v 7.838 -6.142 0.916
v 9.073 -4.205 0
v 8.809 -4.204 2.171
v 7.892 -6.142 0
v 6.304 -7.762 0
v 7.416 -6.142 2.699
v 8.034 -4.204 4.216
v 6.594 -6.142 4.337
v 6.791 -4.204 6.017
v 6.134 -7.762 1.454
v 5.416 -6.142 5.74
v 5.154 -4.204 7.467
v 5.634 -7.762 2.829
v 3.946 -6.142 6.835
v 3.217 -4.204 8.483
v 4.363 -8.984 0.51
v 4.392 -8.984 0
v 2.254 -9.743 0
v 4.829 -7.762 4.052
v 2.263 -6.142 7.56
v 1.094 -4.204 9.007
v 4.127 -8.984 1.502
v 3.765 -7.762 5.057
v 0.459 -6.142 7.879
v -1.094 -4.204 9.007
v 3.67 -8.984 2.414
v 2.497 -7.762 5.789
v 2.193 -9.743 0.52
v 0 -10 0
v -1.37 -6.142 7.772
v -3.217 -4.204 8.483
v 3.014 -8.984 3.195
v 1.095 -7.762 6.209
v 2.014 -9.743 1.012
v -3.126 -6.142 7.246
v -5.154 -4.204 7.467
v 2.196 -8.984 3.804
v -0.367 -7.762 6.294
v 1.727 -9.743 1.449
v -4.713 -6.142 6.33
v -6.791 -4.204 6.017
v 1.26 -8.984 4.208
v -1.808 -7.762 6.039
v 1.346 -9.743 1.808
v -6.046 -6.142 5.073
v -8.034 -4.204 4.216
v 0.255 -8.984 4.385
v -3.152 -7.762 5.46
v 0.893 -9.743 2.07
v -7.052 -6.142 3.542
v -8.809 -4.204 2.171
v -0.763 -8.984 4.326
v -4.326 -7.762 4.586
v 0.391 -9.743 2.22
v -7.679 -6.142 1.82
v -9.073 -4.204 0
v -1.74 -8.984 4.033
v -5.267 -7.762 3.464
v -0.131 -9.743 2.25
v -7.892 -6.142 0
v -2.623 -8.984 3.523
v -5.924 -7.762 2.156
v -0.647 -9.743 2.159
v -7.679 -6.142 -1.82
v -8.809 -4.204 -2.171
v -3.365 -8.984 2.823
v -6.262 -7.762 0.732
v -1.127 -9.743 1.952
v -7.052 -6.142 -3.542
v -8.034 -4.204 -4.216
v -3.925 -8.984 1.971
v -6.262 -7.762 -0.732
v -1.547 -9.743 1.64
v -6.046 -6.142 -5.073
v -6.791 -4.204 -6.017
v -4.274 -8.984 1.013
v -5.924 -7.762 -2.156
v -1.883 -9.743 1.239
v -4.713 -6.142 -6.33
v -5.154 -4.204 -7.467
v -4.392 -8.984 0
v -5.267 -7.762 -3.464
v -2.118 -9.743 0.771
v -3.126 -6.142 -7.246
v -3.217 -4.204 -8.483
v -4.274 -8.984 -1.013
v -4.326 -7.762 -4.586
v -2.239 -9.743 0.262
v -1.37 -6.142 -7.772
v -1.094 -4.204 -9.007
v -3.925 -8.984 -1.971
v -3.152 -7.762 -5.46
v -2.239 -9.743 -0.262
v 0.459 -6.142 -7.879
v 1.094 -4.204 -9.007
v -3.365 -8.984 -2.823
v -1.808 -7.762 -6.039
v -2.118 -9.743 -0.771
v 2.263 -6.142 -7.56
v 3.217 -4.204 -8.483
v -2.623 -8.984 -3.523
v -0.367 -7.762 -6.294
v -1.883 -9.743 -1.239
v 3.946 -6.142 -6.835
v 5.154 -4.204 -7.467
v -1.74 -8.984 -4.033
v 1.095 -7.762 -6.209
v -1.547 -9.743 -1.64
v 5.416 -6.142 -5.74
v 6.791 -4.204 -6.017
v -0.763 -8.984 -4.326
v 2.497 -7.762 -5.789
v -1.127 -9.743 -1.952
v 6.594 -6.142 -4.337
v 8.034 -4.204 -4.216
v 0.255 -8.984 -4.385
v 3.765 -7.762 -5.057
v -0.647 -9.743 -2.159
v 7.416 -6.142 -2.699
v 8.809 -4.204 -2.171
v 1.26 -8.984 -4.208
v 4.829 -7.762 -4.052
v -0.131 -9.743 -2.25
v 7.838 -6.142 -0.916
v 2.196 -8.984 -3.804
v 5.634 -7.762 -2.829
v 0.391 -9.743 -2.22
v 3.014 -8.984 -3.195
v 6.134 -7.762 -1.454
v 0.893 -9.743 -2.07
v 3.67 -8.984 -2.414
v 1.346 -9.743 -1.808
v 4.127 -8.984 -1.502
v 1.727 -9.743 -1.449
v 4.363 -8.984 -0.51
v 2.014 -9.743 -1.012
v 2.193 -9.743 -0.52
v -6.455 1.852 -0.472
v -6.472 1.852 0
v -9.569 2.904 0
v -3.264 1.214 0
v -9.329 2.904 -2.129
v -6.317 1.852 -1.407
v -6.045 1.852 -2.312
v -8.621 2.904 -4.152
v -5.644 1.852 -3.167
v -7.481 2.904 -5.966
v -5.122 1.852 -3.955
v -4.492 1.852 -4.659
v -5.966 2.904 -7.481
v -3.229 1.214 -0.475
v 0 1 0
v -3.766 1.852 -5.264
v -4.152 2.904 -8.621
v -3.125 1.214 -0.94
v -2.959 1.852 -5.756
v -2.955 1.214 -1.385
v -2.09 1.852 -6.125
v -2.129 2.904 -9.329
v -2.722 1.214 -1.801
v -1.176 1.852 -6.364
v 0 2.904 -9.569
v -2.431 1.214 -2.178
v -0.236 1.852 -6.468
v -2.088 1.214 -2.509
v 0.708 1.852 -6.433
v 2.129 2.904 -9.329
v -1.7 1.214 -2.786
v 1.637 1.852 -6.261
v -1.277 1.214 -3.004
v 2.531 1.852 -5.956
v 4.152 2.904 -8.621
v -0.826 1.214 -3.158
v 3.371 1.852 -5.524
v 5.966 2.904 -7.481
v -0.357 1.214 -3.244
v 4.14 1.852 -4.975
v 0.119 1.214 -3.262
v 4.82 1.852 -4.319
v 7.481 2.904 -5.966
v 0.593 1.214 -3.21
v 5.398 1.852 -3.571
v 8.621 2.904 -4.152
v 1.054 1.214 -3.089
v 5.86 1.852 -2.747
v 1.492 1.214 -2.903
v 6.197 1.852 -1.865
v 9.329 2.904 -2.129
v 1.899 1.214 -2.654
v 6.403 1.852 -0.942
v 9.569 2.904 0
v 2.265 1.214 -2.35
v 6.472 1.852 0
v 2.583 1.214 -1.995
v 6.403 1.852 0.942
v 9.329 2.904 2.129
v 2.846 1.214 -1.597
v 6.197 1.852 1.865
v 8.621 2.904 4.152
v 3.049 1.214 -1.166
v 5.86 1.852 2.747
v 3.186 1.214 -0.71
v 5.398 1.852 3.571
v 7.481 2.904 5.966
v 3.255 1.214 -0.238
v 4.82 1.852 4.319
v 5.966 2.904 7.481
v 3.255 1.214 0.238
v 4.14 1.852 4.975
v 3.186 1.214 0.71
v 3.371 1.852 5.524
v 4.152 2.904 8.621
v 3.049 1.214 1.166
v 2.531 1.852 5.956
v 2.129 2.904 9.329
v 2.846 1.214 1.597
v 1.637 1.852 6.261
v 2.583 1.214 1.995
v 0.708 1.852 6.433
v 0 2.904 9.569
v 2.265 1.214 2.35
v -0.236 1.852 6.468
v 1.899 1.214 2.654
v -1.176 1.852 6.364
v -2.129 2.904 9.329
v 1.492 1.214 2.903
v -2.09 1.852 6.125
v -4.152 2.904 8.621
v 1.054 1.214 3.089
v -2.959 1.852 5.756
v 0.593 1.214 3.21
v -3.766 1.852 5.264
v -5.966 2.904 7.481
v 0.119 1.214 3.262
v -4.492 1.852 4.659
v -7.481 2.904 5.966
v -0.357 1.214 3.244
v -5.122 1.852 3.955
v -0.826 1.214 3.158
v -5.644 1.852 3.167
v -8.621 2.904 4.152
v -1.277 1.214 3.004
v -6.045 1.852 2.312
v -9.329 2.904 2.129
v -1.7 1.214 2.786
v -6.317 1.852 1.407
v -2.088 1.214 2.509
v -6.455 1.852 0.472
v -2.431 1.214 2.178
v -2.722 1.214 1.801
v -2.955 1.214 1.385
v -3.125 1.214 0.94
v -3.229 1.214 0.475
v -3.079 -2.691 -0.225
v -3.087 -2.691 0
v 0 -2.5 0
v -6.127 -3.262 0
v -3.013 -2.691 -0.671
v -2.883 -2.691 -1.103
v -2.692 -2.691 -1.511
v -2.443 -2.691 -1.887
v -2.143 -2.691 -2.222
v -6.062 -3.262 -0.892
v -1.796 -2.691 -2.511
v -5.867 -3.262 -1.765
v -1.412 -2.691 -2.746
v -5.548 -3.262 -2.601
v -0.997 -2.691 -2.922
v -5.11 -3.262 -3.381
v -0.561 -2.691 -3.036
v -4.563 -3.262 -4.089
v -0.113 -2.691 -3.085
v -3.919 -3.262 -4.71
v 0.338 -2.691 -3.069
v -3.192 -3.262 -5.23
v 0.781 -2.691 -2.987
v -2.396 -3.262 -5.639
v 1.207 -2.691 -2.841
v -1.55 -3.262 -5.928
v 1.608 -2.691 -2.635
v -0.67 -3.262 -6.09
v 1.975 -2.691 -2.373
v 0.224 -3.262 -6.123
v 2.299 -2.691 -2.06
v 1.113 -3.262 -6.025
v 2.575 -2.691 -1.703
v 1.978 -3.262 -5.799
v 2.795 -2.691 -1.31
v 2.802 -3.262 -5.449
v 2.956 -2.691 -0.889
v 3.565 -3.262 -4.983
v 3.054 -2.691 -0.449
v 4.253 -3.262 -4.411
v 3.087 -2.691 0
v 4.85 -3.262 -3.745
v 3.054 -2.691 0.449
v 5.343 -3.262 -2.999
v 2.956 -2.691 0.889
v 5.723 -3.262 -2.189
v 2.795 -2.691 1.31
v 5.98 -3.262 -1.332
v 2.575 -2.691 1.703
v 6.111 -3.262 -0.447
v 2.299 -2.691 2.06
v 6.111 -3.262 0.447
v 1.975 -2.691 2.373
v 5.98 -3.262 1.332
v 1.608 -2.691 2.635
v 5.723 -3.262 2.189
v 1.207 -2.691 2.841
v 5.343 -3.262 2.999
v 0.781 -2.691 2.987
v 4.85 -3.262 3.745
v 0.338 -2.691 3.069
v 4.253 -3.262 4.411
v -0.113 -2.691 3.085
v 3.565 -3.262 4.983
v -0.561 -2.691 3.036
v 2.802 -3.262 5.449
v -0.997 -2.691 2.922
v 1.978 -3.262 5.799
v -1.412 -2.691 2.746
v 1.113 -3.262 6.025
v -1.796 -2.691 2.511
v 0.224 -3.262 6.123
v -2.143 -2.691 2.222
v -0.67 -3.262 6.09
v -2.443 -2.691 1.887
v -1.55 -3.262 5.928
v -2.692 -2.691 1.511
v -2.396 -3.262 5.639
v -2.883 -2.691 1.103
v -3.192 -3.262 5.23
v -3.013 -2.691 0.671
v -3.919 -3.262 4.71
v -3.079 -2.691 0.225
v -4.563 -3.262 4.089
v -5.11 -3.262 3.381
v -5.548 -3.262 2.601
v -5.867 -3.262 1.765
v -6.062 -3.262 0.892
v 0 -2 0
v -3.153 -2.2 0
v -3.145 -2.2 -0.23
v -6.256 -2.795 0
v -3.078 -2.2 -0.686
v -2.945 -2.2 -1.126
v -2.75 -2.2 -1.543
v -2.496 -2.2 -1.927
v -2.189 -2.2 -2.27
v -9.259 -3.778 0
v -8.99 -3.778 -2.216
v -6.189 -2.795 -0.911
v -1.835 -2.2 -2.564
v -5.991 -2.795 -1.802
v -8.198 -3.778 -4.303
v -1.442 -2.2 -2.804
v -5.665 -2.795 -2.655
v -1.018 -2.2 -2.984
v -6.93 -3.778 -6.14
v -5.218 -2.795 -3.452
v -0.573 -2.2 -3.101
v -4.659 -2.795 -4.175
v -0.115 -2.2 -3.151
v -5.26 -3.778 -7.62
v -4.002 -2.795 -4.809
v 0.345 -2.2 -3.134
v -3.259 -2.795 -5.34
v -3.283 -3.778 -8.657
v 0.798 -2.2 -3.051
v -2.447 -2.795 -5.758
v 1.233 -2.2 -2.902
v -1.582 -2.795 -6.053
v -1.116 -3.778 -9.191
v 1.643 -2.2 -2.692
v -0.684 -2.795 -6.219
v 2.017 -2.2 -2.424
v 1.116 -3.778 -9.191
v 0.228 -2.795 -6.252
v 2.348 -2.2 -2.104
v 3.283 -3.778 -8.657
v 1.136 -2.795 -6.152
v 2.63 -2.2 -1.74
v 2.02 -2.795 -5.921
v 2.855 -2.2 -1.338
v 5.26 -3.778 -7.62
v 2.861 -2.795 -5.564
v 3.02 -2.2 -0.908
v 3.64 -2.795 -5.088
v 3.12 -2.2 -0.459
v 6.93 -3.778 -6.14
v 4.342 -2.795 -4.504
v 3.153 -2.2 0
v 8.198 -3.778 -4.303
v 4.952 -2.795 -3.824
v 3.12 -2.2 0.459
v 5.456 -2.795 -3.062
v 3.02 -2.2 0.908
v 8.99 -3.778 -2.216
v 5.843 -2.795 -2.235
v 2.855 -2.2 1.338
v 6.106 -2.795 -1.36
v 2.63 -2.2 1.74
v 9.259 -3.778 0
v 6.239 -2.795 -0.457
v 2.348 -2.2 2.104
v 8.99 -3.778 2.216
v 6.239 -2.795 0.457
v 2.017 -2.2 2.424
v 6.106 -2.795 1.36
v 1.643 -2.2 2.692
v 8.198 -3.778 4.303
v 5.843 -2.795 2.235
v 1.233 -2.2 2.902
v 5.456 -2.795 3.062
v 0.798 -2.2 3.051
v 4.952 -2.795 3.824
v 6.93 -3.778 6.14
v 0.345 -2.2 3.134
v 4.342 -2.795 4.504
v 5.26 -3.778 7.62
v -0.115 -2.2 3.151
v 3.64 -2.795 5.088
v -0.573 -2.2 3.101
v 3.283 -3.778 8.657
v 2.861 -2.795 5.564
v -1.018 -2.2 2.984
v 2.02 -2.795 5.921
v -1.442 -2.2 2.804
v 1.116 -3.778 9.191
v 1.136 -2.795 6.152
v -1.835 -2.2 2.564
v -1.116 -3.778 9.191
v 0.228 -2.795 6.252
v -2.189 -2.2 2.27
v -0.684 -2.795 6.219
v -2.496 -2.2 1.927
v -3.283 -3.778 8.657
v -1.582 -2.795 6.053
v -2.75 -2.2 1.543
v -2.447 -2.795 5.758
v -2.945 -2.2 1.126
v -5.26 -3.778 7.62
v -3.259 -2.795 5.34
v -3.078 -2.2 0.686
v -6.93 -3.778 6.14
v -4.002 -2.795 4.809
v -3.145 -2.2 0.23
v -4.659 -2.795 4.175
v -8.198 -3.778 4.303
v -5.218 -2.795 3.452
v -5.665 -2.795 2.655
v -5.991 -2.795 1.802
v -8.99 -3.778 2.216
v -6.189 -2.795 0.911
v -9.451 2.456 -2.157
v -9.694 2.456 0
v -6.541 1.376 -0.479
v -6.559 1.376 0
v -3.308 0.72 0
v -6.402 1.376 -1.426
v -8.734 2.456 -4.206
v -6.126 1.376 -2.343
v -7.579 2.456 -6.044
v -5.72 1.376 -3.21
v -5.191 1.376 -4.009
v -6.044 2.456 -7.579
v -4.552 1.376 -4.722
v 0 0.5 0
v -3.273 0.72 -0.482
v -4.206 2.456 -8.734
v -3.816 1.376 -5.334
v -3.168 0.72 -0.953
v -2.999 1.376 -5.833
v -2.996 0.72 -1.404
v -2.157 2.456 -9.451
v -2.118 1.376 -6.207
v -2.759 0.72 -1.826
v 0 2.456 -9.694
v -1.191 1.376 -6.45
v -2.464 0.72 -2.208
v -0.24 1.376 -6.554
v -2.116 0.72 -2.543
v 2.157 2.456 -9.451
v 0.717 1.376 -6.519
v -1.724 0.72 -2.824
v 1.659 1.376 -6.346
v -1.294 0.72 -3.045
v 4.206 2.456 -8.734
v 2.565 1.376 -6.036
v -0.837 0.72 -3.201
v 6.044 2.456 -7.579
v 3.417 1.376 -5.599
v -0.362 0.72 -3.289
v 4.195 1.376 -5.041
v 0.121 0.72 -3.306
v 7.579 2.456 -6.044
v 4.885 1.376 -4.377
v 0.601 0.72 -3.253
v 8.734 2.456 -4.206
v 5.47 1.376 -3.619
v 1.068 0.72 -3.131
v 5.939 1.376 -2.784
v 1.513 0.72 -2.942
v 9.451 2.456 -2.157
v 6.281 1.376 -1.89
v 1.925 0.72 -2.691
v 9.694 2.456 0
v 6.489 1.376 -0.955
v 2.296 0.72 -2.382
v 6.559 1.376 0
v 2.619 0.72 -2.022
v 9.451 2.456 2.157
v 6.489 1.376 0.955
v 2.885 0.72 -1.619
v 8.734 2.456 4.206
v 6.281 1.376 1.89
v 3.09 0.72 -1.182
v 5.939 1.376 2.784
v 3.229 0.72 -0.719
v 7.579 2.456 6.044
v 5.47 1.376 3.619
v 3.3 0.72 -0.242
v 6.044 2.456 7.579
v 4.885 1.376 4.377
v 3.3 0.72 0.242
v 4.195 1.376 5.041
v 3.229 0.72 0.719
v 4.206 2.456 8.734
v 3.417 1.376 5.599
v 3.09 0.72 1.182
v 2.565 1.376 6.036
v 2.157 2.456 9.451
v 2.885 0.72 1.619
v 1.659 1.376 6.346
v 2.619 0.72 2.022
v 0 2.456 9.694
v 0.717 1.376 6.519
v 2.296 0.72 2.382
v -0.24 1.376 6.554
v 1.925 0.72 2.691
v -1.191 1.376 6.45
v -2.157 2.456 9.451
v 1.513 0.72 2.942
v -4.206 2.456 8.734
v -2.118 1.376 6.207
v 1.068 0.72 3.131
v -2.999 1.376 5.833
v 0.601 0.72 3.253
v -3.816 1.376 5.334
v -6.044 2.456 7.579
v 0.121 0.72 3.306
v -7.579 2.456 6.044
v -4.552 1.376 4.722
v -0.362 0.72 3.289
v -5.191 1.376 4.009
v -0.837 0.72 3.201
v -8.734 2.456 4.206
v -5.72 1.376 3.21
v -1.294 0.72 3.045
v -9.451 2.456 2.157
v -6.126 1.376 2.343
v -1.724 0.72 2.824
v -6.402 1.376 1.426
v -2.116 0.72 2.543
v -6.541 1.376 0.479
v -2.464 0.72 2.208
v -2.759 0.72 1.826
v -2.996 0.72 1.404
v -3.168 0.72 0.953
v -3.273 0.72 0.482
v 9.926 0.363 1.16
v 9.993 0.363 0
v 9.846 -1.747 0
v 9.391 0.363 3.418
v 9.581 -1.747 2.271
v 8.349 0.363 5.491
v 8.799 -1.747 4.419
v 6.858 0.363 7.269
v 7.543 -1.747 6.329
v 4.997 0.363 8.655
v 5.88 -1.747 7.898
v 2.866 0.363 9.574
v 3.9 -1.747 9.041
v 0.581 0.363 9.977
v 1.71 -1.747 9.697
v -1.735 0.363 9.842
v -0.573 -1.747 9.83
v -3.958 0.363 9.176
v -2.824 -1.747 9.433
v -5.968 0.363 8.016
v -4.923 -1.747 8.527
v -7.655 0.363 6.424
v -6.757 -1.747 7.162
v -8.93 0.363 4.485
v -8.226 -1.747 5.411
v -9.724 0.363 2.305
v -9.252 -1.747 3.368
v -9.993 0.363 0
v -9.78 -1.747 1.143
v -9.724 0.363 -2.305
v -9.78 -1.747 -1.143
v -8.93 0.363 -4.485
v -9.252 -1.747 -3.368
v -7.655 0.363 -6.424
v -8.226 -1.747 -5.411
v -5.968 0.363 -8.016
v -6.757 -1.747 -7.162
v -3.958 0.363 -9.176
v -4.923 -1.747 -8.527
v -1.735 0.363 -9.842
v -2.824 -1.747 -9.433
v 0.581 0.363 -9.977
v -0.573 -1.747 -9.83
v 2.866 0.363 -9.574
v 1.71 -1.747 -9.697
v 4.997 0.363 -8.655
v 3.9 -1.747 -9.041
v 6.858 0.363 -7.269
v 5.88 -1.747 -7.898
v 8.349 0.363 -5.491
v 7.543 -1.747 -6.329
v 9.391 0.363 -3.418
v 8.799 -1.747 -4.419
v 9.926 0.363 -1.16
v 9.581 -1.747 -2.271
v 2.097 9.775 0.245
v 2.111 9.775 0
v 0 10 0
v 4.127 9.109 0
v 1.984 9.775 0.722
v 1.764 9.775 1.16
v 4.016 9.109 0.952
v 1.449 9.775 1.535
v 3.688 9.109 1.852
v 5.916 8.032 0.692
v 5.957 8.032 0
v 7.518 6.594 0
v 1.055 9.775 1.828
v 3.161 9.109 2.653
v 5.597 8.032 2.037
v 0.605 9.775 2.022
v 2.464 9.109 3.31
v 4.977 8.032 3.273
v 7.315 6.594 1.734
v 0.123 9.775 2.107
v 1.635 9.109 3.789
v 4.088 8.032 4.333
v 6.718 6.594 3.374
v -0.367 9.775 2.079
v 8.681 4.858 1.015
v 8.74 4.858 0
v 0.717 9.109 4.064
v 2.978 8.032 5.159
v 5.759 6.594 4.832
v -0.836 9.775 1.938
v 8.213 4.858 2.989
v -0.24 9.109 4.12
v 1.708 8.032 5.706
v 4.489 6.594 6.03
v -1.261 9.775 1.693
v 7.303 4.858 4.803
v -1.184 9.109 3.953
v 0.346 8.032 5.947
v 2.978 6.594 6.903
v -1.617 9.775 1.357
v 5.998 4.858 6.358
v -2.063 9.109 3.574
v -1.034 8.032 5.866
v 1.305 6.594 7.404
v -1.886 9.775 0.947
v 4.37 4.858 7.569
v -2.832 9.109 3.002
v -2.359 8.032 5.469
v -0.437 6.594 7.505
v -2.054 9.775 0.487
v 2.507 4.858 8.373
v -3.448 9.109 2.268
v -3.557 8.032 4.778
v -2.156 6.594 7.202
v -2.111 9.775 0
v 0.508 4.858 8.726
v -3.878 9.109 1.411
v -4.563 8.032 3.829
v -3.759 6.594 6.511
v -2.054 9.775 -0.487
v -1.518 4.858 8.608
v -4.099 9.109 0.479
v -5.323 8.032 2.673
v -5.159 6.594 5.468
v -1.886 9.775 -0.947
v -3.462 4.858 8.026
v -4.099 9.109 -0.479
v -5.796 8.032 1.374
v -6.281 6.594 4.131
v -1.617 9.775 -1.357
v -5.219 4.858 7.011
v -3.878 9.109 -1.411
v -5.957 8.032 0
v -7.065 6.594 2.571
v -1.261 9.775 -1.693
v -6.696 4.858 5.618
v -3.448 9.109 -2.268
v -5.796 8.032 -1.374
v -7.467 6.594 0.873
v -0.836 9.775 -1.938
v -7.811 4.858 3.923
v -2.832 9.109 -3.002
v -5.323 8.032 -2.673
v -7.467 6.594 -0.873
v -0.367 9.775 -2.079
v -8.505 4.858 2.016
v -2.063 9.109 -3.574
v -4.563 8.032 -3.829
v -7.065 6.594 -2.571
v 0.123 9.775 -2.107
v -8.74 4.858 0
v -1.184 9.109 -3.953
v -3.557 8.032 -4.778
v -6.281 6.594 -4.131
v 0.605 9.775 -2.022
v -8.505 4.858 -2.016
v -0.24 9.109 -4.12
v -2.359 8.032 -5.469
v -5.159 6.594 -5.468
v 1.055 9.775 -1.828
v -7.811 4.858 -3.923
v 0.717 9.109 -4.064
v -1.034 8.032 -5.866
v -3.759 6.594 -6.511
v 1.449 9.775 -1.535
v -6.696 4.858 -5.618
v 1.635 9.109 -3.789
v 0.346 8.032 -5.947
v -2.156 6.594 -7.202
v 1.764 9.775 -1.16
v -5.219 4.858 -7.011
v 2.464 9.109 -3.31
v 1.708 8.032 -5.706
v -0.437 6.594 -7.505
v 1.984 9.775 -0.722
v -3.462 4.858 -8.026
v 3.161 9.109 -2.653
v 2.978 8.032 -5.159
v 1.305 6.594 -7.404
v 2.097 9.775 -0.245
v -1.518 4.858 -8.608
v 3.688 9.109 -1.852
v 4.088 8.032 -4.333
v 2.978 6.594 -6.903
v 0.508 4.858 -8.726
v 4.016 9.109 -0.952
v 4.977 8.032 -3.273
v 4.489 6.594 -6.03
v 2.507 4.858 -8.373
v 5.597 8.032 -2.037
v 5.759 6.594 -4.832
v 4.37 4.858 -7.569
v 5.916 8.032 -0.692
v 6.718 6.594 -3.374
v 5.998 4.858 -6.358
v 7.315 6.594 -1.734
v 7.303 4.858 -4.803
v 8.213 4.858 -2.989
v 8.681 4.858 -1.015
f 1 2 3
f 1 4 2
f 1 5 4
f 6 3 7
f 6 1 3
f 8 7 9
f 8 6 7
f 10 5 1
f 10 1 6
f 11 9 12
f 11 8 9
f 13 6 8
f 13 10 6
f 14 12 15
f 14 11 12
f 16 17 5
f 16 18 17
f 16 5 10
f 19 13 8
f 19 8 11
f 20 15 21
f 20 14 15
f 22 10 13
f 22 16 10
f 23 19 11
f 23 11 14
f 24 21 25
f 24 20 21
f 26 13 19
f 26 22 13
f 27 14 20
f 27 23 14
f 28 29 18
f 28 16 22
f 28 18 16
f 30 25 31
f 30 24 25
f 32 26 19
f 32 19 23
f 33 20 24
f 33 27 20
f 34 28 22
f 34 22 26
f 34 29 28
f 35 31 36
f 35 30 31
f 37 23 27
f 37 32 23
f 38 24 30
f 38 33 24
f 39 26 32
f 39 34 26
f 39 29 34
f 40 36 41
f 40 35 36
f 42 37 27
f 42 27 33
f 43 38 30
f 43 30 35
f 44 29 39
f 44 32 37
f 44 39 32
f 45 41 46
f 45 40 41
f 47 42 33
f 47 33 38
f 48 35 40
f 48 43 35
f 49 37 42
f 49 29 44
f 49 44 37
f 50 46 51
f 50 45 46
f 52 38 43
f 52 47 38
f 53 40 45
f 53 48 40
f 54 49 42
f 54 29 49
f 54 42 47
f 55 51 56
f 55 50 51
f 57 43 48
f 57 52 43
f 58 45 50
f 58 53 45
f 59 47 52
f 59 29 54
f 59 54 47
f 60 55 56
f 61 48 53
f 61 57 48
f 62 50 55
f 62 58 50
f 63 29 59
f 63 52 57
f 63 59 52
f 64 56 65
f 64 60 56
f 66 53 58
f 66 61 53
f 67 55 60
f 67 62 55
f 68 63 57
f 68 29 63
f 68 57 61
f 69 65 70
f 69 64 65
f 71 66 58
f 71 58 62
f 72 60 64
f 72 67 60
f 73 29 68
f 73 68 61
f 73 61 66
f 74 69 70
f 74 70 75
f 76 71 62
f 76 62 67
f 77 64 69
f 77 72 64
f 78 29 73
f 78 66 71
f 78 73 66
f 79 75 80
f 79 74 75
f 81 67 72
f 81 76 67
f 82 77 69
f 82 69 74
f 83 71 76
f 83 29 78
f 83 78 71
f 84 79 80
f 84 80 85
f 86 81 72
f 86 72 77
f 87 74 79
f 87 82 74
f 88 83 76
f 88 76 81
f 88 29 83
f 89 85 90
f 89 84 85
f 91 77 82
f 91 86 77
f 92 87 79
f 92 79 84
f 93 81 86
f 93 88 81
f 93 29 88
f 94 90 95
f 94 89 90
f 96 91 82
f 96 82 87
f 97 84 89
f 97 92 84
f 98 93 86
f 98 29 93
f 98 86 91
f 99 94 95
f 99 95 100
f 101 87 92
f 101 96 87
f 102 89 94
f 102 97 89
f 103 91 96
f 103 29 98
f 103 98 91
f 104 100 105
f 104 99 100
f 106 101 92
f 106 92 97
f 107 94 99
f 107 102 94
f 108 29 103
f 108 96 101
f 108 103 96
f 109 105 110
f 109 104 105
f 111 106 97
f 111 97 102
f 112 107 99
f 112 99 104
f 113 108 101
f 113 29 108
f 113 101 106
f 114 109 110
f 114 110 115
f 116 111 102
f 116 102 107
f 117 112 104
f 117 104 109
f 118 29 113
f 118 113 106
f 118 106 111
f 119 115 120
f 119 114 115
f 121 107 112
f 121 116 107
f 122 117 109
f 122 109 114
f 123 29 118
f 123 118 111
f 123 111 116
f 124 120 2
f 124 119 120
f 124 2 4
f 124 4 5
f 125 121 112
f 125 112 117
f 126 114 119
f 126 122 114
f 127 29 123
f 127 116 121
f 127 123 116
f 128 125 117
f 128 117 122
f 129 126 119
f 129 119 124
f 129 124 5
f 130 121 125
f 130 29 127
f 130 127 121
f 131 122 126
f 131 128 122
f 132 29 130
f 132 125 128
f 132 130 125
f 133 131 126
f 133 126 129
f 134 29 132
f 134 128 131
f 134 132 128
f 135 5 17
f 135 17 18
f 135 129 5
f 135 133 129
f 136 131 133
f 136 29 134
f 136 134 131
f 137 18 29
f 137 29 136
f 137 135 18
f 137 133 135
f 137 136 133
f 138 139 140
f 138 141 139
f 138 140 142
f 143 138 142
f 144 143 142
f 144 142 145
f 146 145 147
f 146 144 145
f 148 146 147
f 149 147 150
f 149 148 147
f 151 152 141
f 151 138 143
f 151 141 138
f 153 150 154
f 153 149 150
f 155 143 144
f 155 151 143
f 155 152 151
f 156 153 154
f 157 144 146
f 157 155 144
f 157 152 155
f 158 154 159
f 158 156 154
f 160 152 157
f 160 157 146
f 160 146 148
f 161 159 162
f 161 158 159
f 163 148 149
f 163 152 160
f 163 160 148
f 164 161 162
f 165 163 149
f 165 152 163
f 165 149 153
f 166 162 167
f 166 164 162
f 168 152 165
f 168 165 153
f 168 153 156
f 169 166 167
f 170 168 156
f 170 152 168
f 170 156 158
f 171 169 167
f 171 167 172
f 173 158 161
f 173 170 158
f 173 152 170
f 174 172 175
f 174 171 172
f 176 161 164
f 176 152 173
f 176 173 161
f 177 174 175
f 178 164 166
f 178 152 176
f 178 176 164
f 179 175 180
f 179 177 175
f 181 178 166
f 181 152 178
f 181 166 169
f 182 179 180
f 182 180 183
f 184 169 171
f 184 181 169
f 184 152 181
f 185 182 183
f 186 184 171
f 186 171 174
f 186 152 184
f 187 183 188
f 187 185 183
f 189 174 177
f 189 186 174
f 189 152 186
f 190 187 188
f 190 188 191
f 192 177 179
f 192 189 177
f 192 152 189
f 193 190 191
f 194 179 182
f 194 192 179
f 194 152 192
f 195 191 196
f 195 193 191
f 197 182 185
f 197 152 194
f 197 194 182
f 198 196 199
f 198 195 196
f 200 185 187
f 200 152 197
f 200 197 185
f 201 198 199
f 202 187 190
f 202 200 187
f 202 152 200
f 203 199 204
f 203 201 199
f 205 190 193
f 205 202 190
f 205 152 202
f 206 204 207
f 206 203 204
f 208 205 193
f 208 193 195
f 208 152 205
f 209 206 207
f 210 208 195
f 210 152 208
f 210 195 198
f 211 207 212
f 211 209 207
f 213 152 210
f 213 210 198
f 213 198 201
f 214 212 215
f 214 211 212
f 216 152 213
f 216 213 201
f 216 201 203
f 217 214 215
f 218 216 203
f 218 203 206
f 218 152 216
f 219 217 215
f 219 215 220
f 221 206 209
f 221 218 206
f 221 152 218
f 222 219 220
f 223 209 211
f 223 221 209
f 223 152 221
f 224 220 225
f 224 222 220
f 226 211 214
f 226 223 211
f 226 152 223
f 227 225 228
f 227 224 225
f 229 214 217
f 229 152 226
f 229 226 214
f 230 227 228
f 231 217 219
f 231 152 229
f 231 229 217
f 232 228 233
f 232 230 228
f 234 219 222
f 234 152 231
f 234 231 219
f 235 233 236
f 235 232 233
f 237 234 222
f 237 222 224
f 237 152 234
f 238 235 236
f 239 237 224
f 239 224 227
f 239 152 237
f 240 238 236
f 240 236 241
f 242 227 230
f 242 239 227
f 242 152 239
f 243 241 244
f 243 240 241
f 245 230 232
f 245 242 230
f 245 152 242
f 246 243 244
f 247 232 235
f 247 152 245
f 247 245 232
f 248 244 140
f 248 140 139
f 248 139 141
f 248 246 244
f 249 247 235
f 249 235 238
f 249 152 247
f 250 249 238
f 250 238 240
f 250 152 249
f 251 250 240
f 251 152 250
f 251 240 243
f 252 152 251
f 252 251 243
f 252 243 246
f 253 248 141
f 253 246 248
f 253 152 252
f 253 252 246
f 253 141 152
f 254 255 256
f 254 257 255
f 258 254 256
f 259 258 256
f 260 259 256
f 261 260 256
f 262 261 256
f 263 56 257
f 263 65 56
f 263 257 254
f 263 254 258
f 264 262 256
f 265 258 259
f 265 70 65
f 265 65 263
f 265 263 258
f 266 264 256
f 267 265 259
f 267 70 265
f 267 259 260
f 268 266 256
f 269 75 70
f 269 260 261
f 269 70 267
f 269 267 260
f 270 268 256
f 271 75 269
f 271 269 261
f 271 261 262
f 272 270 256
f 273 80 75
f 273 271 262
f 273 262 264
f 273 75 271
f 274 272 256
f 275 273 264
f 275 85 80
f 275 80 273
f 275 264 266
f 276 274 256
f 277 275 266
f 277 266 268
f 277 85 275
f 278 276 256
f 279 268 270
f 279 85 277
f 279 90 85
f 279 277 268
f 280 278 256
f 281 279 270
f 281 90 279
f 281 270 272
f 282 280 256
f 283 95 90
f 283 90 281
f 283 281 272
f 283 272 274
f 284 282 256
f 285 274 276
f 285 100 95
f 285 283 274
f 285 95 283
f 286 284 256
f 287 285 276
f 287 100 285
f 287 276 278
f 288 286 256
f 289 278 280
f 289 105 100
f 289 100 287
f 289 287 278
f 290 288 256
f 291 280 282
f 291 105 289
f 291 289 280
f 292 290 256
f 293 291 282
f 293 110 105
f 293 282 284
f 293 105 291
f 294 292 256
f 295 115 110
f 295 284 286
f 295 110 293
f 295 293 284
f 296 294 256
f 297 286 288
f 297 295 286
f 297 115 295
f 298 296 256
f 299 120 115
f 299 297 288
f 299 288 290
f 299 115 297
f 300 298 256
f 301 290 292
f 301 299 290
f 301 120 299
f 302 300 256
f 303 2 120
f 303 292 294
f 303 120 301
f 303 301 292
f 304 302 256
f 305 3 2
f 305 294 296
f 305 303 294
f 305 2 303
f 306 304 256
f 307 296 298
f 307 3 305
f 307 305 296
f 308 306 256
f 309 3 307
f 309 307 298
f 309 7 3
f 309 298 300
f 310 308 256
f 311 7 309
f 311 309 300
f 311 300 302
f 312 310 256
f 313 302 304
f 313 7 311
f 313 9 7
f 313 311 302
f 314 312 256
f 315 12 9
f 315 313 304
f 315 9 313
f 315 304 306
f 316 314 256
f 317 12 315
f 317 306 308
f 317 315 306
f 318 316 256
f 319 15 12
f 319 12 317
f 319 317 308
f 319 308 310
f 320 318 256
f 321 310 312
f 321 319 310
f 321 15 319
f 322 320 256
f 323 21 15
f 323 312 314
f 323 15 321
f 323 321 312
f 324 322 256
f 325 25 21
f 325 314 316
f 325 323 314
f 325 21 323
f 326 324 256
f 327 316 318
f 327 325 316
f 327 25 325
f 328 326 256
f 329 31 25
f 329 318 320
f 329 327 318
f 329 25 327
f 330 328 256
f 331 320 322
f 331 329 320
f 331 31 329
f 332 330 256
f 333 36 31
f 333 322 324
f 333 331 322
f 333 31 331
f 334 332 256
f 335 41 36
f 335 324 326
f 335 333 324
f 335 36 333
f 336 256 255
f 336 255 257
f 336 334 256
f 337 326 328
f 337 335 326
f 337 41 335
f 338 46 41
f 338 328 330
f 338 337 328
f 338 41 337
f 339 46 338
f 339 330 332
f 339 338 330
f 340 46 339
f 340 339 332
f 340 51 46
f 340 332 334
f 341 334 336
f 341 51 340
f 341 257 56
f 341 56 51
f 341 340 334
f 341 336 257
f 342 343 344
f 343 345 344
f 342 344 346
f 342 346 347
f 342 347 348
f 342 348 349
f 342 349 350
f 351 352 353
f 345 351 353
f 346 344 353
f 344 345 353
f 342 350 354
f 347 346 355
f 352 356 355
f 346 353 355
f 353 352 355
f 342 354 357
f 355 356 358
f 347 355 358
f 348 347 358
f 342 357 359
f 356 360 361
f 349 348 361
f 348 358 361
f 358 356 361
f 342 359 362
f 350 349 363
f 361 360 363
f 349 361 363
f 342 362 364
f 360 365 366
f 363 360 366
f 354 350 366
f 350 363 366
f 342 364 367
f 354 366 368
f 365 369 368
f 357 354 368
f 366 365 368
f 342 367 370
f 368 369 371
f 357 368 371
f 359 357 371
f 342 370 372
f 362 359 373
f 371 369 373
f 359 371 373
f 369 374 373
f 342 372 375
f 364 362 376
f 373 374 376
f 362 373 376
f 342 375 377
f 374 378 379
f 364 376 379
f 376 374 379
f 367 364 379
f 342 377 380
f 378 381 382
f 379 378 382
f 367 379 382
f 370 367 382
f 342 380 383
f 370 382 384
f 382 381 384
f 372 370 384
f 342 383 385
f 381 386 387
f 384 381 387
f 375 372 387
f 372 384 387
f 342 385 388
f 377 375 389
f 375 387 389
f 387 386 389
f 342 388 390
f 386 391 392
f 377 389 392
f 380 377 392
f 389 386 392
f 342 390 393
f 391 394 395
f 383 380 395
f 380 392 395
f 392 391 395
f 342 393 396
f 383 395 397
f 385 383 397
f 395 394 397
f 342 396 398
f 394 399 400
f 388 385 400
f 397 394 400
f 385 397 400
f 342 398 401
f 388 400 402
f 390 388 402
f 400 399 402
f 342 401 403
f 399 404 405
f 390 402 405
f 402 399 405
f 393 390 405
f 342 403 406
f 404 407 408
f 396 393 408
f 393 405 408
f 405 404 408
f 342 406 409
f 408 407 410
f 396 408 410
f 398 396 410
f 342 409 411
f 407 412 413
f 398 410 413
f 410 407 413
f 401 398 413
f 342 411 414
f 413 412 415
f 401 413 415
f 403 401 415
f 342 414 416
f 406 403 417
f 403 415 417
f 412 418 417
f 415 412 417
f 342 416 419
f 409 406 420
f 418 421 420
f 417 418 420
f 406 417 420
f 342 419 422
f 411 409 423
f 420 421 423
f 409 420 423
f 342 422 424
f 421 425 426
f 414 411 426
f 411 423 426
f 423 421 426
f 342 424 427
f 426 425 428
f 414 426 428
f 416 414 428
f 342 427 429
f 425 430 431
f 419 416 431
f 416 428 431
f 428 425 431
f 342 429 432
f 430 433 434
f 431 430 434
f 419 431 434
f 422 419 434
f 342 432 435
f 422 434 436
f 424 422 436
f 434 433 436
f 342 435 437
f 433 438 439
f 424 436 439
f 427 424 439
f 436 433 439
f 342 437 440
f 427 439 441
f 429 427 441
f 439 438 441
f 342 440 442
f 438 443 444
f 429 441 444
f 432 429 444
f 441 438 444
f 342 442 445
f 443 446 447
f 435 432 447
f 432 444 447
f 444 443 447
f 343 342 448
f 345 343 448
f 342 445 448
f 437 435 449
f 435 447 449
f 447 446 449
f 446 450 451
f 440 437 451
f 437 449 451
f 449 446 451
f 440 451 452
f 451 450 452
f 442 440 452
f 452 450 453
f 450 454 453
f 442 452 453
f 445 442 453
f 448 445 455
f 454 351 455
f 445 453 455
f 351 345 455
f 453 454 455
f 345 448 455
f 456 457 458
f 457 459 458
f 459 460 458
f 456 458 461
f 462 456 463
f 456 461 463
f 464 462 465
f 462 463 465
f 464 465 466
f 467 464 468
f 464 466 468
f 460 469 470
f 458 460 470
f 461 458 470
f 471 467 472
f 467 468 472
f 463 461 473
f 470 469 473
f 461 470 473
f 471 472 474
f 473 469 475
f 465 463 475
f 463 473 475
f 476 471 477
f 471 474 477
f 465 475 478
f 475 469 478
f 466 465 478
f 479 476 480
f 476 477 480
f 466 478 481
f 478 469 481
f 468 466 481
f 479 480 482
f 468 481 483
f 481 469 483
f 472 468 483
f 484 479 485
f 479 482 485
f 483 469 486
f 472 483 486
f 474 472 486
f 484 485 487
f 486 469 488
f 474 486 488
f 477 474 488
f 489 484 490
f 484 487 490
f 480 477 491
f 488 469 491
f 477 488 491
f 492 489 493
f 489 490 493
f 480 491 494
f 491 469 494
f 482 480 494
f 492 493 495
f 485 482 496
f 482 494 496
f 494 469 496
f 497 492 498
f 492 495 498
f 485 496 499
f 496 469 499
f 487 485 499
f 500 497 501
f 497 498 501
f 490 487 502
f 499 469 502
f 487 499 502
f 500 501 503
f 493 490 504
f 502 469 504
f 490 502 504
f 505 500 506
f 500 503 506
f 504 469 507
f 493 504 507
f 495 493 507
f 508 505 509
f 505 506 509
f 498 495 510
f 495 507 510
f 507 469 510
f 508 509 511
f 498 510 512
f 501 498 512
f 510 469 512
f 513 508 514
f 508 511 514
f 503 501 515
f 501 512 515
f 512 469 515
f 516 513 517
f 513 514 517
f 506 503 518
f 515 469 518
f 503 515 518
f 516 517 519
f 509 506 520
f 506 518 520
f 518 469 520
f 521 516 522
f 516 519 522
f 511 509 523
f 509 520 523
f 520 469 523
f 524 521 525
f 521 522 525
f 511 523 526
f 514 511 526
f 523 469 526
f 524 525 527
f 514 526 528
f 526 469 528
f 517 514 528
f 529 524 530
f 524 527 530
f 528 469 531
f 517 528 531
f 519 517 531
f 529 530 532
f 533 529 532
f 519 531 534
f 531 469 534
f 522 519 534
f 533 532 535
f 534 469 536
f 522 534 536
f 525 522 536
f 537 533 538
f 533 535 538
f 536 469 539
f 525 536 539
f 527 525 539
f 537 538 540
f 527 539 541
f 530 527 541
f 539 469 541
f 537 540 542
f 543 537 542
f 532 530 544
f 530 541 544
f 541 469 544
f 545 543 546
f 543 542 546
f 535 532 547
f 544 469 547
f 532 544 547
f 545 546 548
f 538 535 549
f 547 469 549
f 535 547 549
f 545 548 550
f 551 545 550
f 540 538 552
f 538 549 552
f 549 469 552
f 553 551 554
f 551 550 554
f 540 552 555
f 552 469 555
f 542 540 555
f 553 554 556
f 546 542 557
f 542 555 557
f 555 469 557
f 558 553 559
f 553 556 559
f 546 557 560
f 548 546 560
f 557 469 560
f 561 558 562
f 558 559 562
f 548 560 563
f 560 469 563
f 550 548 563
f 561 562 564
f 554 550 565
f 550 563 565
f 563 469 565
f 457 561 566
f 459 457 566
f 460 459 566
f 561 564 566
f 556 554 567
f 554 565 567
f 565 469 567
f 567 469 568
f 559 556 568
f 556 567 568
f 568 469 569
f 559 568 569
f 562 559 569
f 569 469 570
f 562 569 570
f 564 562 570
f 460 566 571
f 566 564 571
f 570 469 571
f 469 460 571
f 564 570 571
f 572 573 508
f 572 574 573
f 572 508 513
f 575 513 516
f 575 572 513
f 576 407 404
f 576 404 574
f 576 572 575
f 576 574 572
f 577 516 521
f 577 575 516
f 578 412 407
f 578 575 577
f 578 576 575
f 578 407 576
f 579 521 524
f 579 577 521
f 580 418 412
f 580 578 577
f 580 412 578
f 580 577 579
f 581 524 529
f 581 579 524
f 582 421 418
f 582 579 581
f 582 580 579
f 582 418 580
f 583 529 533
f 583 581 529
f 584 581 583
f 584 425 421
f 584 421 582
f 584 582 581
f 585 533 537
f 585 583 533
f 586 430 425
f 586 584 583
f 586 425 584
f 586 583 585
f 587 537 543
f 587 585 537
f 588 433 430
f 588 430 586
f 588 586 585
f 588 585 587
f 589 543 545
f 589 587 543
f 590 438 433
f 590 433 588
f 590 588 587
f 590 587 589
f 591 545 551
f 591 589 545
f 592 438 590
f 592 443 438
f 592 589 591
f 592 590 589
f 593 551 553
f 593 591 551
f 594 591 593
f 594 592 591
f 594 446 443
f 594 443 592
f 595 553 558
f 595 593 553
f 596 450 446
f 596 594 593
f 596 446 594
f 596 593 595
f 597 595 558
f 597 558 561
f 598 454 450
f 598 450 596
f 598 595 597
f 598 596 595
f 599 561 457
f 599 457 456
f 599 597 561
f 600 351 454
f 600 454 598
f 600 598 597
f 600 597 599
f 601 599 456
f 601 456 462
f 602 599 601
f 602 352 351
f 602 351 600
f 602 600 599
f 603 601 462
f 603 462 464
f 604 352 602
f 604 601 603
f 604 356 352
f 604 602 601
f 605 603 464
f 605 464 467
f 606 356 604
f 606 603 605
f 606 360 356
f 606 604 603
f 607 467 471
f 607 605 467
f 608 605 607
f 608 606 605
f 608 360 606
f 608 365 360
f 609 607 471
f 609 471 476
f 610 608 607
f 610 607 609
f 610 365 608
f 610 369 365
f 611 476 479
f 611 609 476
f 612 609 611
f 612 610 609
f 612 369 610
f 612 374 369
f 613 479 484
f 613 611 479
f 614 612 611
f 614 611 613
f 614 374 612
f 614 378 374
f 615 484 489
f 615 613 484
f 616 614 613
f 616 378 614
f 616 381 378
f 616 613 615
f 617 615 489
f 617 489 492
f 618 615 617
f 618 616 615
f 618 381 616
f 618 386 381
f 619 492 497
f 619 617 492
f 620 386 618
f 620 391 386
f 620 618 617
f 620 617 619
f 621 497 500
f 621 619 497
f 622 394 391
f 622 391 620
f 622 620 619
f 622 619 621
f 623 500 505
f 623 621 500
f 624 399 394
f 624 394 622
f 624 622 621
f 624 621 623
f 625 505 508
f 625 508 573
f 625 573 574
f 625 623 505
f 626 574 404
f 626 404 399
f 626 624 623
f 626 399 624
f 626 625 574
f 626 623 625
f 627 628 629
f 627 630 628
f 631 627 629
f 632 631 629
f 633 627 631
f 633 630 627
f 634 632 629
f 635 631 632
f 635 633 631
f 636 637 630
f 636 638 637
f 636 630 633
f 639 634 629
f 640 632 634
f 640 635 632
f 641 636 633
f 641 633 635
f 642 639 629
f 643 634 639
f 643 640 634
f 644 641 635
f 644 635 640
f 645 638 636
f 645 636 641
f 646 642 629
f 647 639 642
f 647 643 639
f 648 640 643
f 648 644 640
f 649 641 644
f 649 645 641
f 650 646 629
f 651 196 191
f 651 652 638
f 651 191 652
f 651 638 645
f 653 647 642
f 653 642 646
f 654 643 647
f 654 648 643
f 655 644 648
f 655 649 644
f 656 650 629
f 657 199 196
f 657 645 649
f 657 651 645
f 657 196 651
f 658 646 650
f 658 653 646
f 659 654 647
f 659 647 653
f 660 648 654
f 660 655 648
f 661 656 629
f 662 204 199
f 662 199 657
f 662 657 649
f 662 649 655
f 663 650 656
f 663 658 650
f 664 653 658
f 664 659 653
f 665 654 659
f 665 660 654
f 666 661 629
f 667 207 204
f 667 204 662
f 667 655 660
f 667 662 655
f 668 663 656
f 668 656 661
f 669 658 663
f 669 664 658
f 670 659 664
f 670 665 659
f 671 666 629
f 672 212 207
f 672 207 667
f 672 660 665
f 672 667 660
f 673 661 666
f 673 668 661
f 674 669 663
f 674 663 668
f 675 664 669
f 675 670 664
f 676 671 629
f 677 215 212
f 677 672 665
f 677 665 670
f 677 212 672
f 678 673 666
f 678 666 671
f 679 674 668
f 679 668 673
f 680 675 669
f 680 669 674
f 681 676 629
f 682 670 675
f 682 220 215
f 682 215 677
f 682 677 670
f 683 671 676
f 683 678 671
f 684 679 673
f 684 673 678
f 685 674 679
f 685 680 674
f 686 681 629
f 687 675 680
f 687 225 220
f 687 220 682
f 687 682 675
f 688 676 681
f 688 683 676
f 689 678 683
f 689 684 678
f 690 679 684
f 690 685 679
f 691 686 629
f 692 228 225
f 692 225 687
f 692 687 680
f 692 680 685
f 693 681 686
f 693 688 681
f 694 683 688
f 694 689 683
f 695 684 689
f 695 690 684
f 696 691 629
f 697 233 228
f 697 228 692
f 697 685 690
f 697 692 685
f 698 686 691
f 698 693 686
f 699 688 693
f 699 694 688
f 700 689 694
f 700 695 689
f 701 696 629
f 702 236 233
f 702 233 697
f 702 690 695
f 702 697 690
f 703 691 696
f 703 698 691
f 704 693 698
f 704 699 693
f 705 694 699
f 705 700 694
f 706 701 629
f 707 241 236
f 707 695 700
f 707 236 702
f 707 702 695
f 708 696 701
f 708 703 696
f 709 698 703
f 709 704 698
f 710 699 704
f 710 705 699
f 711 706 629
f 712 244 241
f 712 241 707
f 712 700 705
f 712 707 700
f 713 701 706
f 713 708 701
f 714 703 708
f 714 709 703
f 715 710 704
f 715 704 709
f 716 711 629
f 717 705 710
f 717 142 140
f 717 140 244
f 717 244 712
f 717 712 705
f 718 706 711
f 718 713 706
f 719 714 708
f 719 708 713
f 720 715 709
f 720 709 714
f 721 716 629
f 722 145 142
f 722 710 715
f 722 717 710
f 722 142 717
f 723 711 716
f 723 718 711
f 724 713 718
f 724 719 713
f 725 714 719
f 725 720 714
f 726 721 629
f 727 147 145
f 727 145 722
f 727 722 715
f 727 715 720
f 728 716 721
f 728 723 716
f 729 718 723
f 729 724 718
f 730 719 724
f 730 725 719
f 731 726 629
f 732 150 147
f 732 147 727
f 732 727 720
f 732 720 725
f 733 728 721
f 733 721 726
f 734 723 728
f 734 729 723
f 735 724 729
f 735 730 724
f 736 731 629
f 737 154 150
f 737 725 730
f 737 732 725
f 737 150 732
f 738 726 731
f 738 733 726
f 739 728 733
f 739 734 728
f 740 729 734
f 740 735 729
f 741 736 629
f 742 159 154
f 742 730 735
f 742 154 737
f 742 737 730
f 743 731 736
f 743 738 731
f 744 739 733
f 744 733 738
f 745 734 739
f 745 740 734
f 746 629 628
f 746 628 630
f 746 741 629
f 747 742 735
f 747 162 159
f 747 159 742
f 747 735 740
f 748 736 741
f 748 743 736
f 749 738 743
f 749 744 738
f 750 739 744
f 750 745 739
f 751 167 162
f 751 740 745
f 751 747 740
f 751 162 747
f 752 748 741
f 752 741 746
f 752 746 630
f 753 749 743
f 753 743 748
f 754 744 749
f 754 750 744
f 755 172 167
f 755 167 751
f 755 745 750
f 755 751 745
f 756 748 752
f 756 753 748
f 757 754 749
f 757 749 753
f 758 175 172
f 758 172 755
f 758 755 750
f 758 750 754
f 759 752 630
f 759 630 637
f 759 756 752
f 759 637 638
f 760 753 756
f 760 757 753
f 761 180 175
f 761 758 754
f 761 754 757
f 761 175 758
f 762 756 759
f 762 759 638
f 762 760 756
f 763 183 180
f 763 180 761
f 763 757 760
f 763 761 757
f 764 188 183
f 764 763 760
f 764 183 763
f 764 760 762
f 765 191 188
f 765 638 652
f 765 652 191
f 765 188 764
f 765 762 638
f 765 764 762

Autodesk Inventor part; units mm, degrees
ref_plane "YZ Plane" through (0, 0, 0) normal (1, 0, 0) x (0, 1, 0)
ref_plane "XZ Plane" through (0, 0, 0) normal (0, 1, 0) x (-1, 0, 0)
ref_plane "XY Plane" through (0, 0, 0) normal (0, 0, 1) x (1, 0, 0)
sketch "Esboço1" plane through (0, 0, 0) normal (0, 0, 1) x (1, 0, 0)
  circle A0 centre (0, 0) radius 10 construction
  arc A1 (0, 10) -> (0, -10) centre (0, 0) ccw
  line L0 (0, 10) -> (0, 0)
  line L1 (0, 0) -> (0, -10)
  line L2 (-14, 0) -> (14, 0) projected
  line L3 (0, -38.2) -> (0, 36.7) projected
  line L4 (0, 0) -> (0, -2) construction
  arc A2 (9.259, -3.7778) -> (-9.259, -3.7778) centre (0, -27) ccw
  line L5 (0, 2) -> (0, 0) construction
  arc A3 (-9.5691, 2.9038) -> (9.5691, 2.9038) centre (0, 26) ccw
  arc A4 (9.0731, -4.2045) -> (-9.0731, -4.2045) centre (0, -27.5) ccw
  arc A5 (-9.6937, 2.4559) -> (9.6937, 2.4559) centre (0, 25.5) ccw
  point P0 (0, 1)
  point P1 (0, -2.5)
  point P2 (0, 0.5)
  point P3 (0, -2.5)
  point P4 (0, -2)
  point P5 (0, 0.5)
  point P6 (0, 1)
  dimension "d0" = 20
  dimension "d6" = 2
  dimension "d7" = 25
  dimension "d8" = 0.5
  dimension "d9" = 0.5
revolve "Revolução1" add sketch "Esboço1" angle 360 mid plane about axis through (0, -10, 0) along (0, 1, 0)
revolve "Revolução2" cut sketch "Esboço1" angle 360 about axis through (0, -10, 0) along (0, 1, 0) contours A3 L0 A5 A1 | A2 L1 A4 A1
properties part number "Sessao8_07_04_2025_0003_0001" material "Ouro"
